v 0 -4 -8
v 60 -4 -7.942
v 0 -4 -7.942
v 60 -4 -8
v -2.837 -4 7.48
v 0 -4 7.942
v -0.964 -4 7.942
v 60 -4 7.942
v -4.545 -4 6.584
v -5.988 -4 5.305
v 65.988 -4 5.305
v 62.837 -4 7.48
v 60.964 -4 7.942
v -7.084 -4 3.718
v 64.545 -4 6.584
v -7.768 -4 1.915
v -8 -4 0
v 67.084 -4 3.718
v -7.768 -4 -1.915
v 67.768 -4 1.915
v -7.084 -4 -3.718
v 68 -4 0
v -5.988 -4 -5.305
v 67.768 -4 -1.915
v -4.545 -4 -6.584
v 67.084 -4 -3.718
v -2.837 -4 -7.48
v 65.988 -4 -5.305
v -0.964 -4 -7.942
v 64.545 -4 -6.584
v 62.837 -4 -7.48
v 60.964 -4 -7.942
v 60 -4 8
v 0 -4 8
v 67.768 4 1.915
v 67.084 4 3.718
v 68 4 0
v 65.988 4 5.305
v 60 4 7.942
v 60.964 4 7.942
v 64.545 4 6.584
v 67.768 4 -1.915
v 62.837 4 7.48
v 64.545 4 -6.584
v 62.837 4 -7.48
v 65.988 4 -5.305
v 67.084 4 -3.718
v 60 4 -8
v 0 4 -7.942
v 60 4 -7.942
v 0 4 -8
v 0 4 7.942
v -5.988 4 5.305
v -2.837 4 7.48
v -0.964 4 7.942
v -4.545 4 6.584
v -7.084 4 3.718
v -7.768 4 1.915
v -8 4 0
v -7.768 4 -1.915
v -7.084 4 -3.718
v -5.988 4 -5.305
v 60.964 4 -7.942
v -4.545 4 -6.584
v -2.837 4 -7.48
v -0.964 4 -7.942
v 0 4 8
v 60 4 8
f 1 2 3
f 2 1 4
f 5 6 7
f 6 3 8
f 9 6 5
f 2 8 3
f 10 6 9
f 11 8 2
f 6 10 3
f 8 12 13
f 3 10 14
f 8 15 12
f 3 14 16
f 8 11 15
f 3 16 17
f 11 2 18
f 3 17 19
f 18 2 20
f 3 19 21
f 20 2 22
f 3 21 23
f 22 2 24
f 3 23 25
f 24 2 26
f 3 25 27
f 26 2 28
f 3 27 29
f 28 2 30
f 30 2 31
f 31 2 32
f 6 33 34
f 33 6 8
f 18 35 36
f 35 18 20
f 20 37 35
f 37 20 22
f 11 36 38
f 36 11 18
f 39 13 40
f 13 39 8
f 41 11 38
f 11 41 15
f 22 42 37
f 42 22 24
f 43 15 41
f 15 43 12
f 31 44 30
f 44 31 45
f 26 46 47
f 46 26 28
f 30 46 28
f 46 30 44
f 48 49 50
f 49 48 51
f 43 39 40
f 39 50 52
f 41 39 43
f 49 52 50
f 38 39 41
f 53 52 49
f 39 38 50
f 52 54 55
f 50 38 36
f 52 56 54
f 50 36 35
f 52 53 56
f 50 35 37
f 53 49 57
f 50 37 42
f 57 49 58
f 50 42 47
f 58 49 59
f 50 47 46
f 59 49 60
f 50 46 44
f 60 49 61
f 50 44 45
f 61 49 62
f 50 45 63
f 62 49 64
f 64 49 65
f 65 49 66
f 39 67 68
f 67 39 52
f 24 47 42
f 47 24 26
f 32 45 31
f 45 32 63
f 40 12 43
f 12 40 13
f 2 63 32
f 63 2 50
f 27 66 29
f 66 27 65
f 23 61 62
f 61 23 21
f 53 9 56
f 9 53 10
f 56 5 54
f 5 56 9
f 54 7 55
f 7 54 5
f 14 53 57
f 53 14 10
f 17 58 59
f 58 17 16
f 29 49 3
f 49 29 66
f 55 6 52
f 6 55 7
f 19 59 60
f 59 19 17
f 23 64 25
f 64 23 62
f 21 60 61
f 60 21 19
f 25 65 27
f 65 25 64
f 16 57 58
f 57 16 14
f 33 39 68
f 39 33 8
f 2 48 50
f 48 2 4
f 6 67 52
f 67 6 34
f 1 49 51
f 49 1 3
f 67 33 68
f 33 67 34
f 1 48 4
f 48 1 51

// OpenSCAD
module oval(clength, cradius, cthick) {
	rotate([90,0,0]) union() {
		translate([clength/2,0,0]) cylinder(h = cthick,r = cradius, center = true);
		translate([-clength/2,0,0]) cylinder(h = cthick, r = cradius, center = true);
		cube(size = [clength, cradius*2, cthick], center = true);
	}
}
module caterpillar(clength, cradius, cthick) {
	color([0.1,0.1,0.1,1]) {
		difference() {
			oval(clength, cradius, cthick);
			oval(clength, cradius*0.9, cthick*1.1);
		}
	}
	color([0.8,0.8,0.8,1]) {
		oval(clength, cradius*0.9, cthick);
	}
}

translate([30, 0, 0]) caterpillar(60, 8, 8);
